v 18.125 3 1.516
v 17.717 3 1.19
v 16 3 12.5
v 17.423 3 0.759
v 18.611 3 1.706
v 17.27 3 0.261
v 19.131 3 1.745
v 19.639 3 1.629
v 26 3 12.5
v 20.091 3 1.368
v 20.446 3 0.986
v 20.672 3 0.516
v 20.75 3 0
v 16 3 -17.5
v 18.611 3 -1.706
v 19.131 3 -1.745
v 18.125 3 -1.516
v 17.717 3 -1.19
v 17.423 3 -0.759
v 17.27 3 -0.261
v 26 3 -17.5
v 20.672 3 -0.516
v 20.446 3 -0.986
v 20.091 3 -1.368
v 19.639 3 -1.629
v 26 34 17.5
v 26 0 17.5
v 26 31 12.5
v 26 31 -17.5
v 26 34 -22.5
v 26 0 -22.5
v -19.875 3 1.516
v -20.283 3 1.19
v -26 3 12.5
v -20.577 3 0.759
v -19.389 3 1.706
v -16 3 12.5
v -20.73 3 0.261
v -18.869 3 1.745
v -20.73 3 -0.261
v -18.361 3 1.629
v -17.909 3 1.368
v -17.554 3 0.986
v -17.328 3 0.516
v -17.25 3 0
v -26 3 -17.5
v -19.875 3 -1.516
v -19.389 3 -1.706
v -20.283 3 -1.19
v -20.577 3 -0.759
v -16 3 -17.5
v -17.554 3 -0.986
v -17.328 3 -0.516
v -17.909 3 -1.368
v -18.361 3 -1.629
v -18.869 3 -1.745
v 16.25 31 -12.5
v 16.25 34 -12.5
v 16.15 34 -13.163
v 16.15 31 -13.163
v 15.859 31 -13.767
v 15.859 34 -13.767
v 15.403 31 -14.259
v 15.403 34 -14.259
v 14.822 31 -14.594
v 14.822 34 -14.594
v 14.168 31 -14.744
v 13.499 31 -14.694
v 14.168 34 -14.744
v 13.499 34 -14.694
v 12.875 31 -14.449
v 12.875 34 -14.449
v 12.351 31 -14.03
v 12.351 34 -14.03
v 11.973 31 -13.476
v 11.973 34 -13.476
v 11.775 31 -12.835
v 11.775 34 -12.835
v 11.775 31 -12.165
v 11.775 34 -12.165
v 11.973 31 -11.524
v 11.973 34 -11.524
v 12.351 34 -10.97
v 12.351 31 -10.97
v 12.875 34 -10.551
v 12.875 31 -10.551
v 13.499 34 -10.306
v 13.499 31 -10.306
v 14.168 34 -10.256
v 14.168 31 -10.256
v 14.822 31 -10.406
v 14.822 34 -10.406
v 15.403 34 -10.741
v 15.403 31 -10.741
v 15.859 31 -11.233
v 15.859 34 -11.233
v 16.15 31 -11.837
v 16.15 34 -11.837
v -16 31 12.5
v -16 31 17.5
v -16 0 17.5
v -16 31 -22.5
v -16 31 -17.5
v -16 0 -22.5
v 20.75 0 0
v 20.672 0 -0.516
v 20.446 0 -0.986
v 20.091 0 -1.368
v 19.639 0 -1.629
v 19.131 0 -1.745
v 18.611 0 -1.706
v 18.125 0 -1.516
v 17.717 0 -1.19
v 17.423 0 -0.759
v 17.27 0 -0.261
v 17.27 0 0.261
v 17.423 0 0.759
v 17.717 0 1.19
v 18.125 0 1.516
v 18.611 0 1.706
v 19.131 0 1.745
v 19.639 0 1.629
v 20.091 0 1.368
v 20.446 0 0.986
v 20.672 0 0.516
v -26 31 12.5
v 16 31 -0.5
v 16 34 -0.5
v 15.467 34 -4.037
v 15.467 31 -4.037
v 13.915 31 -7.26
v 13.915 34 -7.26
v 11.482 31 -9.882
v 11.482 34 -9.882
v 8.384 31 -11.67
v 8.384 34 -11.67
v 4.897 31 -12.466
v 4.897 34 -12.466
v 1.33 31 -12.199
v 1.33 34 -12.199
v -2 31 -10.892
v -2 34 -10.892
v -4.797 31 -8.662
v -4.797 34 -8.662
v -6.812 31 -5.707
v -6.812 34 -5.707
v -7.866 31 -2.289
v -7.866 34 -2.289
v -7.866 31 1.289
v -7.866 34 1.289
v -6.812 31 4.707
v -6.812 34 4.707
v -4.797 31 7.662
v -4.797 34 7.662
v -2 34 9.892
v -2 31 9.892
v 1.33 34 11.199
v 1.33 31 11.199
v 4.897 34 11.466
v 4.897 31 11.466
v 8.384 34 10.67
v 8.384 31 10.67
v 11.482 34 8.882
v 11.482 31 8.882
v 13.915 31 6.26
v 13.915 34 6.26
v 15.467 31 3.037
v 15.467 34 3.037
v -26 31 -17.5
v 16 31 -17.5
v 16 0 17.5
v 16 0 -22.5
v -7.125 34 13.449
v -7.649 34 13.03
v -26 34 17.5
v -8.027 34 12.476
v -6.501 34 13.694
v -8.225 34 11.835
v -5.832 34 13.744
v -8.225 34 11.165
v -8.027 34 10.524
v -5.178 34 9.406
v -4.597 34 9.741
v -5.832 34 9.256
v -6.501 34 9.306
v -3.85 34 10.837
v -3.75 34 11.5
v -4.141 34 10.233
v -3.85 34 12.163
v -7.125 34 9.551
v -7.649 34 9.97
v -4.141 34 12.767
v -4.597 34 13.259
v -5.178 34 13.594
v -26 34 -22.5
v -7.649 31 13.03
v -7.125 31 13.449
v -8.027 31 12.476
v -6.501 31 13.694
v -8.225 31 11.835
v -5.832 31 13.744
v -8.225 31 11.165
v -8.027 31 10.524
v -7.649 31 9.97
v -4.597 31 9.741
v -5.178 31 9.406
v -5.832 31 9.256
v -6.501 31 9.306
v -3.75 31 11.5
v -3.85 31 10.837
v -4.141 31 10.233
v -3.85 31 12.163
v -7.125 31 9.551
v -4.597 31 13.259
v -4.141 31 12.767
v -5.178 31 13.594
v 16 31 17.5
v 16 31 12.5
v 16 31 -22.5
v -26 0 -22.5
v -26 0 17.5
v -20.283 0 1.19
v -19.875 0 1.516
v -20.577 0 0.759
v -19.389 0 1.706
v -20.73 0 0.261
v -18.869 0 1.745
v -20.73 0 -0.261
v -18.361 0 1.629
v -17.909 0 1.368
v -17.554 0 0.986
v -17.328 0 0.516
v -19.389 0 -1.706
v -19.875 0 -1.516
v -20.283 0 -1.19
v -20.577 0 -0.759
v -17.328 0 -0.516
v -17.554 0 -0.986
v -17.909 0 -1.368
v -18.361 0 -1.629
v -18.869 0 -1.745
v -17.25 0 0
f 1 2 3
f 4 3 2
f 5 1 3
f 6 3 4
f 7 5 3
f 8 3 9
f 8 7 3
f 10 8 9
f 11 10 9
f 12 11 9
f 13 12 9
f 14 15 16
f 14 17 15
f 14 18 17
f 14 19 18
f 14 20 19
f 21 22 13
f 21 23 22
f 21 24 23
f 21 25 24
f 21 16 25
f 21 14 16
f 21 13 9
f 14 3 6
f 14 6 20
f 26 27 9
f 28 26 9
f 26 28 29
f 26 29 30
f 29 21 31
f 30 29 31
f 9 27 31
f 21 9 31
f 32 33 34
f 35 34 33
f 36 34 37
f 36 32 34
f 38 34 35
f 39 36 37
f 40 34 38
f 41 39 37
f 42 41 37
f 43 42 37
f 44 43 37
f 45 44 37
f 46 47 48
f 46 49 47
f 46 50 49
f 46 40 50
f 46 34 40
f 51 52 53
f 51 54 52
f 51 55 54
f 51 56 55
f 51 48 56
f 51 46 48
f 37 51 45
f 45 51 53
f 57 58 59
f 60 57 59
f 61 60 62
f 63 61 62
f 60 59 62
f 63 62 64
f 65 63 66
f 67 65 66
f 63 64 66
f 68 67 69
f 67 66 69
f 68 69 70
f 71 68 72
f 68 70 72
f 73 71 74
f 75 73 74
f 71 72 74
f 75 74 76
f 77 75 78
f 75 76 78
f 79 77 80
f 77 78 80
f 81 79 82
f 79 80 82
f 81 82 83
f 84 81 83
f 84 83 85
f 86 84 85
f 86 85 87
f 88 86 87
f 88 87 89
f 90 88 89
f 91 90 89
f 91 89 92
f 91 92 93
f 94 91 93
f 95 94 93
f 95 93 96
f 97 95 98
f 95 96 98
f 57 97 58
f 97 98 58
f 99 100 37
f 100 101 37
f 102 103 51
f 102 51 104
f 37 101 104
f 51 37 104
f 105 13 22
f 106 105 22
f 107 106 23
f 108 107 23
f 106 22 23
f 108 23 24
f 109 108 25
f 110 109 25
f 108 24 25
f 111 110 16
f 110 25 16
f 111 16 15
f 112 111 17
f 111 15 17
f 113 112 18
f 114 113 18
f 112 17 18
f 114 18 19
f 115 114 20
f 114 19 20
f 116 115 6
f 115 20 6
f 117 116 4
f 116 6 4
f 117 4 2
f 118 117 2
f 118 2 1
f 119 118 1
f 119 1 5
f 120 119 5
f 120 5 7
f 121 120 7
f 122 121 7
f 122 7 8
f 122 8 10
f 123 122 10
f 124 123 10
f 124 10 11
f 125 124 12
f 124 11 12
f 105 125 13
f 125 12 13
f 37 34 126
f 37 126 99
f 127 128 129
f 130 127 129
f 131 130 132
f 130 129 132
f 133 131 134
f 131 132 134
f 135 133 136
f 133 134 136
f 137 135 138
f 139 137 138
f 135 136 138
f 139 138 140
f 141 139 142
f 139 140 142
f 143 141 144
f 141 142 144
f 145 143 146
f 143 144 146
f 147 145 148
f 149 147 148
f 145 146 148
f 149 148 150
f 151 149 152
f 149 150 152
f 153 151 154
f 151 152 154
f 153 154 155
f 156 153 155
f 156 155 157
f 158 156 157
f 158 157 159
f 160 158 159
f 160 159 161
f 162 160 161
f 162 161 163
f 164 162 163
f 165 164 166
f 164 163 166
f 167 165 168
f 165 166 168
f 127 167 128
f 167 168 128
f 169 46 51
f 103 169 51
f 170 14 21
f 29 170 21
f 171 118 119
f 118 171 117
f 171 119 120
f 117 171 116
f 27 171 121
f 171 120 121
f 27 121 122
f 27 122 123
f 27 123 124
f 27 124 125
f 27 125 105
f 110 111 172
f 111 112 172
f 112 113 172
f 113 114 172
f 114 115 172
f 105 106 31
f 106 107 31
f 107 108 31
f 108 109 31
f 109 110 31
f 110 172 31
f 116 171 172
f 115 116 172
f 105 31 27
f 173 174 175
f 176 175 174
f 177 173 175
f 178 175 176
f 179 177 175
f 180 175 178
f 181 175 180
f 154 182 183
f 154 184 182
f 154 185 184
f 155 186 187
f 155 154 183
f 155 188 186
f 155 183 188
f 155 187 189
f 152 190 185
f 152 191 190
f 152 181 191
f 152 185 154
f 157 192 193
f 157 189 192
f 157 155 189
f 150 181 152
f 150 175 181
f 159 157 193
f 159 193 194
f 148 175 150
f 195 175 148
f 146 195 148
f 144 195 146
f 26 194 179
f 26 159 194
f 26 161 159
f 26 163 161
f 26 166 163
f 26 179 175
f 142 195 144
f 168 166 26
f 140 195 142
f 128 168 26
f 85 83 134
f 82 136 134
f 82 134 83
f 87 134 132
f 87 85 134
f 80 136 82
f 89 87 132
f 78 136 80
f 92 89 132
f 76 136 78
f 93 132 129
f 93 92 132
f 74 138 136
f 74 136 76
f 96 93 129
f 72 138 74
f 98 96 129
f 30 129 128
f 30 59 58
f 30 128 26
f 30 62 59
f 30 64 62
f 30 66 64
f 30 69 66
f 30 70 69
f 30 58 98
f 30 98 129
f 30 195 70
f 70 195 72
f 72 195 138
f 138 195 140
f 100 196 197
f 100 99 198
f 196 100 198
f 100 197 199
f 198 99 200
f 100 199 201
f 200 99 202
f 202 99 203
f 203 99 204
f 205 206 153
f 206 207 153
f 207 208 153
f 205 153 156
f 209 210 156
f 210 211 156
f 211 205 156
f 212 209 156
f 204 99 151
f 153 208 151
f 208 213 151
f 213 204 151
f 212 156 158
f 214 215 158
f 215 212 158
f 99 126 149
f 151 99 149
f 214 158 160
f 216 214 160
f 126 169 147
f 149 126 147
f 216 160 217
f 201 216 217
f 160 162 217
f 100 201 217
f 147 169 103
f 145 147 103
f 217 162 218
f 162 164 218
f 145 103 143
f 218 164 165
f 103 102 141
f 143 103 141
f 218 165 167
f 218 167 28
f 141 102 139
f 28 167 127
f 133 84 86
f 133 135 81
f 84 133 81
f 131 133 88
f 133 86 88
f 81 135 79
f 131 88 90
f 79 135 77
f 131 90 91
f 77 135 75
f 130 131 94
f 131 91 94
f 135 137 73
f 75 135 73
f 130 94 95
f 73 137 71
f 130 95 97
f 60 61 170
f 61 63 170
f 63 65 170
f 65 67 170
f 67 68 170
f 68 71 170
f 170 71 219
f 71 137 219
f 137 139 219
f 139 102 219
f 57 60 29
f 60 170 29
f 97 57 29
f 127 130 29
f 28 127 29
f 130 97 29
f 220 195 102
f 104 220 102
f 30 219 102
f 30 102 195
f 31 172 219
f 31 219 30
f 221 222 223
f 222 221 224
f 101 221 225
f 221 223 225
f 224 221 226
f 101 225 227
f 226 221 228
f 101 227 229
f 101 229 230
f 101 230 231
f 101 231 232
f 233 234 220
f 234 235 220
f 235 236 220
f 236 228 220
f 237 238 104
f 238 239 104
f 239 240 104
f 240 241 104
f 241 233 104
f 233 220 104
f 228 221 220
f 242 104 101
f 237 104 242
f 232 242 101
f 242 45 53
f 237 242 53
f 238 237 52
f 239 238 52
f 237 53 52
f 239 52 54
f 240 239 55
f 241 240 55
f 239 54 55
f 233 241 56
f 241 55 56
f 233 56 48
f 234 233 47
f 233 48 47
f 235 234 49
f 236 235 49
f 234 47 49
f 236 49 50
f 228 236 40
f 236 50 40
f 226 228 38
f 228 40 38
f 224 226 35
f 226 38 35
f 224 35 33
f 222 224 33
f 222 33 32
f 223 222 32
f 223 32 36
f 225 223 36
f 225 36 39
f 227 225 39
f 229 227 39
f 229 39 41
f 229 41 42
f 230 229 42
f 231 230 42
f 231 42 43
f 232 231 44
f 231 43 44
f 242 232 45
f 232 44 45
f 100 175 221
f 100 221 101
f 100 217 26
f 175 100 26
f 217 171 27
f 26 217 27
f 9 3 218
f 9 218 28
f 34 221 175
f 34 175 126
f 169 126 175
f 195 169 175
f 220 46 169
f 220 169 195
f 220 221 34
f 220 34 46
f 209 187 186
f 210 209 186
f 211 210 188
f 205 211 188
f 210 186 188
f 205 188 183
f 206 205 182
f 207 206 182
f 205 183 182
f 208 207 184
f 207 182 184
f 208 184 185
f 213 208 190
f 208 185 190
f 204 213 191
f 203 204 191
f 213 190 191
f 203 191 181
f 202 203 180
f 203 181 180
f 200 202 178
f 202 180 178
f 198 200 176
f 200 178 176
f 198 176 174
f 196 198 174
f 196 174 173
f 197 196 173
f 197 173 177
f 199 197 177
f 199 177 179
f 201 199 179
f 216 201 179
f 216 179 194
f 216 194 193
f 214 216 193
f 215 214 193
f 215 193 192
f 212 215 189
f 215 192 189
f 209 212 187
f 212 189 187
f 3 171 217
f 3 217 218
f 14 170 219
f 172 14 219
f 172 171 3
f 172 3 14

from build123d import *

# Parameters (mm, degrees)
SKETCH1_W             = 10
SKETCH1_H             = 35
BOSS_EXTRUDE1_DEPTH   = 3
BOSS_EXTRUDE1_2_DEPTH = 3
SKETCH1_3_W           = 10
SKETCH1_3_H           = 5
BOSS_EXTRUDE2_DEPTH   = 31
SKETCH7_W             = 52
SKETCH7_H             = 40
BOSS_EXTRUDE3_DEPTH   = 3
SKETCH8_R             = 12
SKETCH8_R_2           = 2.25
CUT_EXTRUDE4_DEPTH    = 3
SKETCH10_R            = 1.75
CUT_EXTRUDE5_DEPTH    = 3
SKETCH11_W            = 10
SKETCH11_H            = 5
BOSS_EXTRUDE4_DEPTH   = 28


with BuildPart() as part:
    # Sketch1 → Boss-Extrude1 (new body)
    with BuildSketch(Plane(origin=(0, 0, 0), x_dir=(1, 0, 0), z_dir=(0, 1, 0))):
        with Locations((21, 0)):
            Rectangle(SKETCH1_W, SKETCH1_H)
    extrude(amount=BOSS_EXTRUDE1_DEPTH)


with BuildPart() as body_2:
    # Sketch1 → Boss-Extrude1 2 (new body)
    with BuildSketch(Plane(origin=(0, 0, 0), x_dir=(1, 0, 0), z_dir=(0, 1, 0))):
        with Locations((-21, 0)):
            Rectangle(SKETCH1_W, SKETCH1_H)
    extrude(amount=BOSS_EXTRUDE1_2_DEPTH)

    # Sketch1<3> → Boss-Extrude2 (add)
    with BuildSketch(Plane(origin=(0, 0, 0), x_dir=(1, 0, 0), z_dir=(0, 1, 0))):
        with Locations((-21, 20)):
            Rectangle(SKETCH1_3_W, SKETCH1_3_H)
        with Locations((21, 20)):
            Rectangle(SKETCH1_3_W, SKETCH1_3_H)
    extrude(amount=BOSS_EXTRUDE2_DEPTH)

    # Sketch7 → Boss-Extrude3 (add)
    with BuildSketch(Plane(origin=(0, 31, 0), x_dir=(1, 0, 0), z_dir=(0, 1, 0))):
        with Locations((0, 2.5)):
            Rectangle(SKETCH7_W, SKETCH7_H)
    extrude(amount=BOSS_EXTRUDE3_DEPTH)

    # Sketch8 → Cut-Extrude4 (cut)
    with BuildSketch(Plane(origin=(0, 34, 0), x_dir=(1, 0, 0), z_dir=(0, 1, 0))):
        with Locations((4, 0.5)):
            Circle(SKETCH8_R)
        with Locations((-6, -11.5)):
            Circle(SKETCH8_R_2)
        with Locations((14, 12.5)):
            Circle(SKETCH8_R_2)
    extrude(amount=-CUT_EXTRUDE4_DEPTH, mode=Mode.SUBTRACT)


with BuildPart() as cut_extrude5_tool:
    # Sketch10 → Cut-Extrude5 (new body)
    with BuildSketch(Plane(origin=(0, 3, 0), x_dir=(1, 0, 0), z_dir=(0, 1, 0))):
        with Locations((-19, 0)):
            Circle(SKETCH10_R)
        with Locations((19, 0)):
            Circle(SKETCH10_R)
    extrude(amount=-CUT_EXTRUDE5_DEPTH)


with BuildPart() as part_1:
    add(part.part)

    # Cut-Extrude5: cut by cut_extrude5_tool
    add(cut_extrude5_tool.part, mode=Mode.SUBTRACT)



with BuildPart() as body_2_1:
    add(body_2.part)

    # Cut-Extrude5: cut by cut_extrude5_tool
    add(cut_extrude5_tool.part, mode=Mode.SUBTRACT)


with BuildPart() as part_2:
    add(part_1.part)

    add(body_2_1.part)  # Boss-Extrude4 merges body 2
    # Sketch11 → Boss-Extrude4 (add)
    with BuildSketch(Plane(origin=(0, 3, 0), x_dir=(1, 0, 0), z_dir=(0, 1, 0))):
        with Locations((-21, -15)):
            Rectangle(SKETCH11_W, SKETCH11_H)
        with Locations((21, -15)):
            Rectangle(SKETCH11_W, SKETCH11_H)
    extrude(amount=BOSS_EXTRUDE4_DEPTH)


solid = part_2.part
